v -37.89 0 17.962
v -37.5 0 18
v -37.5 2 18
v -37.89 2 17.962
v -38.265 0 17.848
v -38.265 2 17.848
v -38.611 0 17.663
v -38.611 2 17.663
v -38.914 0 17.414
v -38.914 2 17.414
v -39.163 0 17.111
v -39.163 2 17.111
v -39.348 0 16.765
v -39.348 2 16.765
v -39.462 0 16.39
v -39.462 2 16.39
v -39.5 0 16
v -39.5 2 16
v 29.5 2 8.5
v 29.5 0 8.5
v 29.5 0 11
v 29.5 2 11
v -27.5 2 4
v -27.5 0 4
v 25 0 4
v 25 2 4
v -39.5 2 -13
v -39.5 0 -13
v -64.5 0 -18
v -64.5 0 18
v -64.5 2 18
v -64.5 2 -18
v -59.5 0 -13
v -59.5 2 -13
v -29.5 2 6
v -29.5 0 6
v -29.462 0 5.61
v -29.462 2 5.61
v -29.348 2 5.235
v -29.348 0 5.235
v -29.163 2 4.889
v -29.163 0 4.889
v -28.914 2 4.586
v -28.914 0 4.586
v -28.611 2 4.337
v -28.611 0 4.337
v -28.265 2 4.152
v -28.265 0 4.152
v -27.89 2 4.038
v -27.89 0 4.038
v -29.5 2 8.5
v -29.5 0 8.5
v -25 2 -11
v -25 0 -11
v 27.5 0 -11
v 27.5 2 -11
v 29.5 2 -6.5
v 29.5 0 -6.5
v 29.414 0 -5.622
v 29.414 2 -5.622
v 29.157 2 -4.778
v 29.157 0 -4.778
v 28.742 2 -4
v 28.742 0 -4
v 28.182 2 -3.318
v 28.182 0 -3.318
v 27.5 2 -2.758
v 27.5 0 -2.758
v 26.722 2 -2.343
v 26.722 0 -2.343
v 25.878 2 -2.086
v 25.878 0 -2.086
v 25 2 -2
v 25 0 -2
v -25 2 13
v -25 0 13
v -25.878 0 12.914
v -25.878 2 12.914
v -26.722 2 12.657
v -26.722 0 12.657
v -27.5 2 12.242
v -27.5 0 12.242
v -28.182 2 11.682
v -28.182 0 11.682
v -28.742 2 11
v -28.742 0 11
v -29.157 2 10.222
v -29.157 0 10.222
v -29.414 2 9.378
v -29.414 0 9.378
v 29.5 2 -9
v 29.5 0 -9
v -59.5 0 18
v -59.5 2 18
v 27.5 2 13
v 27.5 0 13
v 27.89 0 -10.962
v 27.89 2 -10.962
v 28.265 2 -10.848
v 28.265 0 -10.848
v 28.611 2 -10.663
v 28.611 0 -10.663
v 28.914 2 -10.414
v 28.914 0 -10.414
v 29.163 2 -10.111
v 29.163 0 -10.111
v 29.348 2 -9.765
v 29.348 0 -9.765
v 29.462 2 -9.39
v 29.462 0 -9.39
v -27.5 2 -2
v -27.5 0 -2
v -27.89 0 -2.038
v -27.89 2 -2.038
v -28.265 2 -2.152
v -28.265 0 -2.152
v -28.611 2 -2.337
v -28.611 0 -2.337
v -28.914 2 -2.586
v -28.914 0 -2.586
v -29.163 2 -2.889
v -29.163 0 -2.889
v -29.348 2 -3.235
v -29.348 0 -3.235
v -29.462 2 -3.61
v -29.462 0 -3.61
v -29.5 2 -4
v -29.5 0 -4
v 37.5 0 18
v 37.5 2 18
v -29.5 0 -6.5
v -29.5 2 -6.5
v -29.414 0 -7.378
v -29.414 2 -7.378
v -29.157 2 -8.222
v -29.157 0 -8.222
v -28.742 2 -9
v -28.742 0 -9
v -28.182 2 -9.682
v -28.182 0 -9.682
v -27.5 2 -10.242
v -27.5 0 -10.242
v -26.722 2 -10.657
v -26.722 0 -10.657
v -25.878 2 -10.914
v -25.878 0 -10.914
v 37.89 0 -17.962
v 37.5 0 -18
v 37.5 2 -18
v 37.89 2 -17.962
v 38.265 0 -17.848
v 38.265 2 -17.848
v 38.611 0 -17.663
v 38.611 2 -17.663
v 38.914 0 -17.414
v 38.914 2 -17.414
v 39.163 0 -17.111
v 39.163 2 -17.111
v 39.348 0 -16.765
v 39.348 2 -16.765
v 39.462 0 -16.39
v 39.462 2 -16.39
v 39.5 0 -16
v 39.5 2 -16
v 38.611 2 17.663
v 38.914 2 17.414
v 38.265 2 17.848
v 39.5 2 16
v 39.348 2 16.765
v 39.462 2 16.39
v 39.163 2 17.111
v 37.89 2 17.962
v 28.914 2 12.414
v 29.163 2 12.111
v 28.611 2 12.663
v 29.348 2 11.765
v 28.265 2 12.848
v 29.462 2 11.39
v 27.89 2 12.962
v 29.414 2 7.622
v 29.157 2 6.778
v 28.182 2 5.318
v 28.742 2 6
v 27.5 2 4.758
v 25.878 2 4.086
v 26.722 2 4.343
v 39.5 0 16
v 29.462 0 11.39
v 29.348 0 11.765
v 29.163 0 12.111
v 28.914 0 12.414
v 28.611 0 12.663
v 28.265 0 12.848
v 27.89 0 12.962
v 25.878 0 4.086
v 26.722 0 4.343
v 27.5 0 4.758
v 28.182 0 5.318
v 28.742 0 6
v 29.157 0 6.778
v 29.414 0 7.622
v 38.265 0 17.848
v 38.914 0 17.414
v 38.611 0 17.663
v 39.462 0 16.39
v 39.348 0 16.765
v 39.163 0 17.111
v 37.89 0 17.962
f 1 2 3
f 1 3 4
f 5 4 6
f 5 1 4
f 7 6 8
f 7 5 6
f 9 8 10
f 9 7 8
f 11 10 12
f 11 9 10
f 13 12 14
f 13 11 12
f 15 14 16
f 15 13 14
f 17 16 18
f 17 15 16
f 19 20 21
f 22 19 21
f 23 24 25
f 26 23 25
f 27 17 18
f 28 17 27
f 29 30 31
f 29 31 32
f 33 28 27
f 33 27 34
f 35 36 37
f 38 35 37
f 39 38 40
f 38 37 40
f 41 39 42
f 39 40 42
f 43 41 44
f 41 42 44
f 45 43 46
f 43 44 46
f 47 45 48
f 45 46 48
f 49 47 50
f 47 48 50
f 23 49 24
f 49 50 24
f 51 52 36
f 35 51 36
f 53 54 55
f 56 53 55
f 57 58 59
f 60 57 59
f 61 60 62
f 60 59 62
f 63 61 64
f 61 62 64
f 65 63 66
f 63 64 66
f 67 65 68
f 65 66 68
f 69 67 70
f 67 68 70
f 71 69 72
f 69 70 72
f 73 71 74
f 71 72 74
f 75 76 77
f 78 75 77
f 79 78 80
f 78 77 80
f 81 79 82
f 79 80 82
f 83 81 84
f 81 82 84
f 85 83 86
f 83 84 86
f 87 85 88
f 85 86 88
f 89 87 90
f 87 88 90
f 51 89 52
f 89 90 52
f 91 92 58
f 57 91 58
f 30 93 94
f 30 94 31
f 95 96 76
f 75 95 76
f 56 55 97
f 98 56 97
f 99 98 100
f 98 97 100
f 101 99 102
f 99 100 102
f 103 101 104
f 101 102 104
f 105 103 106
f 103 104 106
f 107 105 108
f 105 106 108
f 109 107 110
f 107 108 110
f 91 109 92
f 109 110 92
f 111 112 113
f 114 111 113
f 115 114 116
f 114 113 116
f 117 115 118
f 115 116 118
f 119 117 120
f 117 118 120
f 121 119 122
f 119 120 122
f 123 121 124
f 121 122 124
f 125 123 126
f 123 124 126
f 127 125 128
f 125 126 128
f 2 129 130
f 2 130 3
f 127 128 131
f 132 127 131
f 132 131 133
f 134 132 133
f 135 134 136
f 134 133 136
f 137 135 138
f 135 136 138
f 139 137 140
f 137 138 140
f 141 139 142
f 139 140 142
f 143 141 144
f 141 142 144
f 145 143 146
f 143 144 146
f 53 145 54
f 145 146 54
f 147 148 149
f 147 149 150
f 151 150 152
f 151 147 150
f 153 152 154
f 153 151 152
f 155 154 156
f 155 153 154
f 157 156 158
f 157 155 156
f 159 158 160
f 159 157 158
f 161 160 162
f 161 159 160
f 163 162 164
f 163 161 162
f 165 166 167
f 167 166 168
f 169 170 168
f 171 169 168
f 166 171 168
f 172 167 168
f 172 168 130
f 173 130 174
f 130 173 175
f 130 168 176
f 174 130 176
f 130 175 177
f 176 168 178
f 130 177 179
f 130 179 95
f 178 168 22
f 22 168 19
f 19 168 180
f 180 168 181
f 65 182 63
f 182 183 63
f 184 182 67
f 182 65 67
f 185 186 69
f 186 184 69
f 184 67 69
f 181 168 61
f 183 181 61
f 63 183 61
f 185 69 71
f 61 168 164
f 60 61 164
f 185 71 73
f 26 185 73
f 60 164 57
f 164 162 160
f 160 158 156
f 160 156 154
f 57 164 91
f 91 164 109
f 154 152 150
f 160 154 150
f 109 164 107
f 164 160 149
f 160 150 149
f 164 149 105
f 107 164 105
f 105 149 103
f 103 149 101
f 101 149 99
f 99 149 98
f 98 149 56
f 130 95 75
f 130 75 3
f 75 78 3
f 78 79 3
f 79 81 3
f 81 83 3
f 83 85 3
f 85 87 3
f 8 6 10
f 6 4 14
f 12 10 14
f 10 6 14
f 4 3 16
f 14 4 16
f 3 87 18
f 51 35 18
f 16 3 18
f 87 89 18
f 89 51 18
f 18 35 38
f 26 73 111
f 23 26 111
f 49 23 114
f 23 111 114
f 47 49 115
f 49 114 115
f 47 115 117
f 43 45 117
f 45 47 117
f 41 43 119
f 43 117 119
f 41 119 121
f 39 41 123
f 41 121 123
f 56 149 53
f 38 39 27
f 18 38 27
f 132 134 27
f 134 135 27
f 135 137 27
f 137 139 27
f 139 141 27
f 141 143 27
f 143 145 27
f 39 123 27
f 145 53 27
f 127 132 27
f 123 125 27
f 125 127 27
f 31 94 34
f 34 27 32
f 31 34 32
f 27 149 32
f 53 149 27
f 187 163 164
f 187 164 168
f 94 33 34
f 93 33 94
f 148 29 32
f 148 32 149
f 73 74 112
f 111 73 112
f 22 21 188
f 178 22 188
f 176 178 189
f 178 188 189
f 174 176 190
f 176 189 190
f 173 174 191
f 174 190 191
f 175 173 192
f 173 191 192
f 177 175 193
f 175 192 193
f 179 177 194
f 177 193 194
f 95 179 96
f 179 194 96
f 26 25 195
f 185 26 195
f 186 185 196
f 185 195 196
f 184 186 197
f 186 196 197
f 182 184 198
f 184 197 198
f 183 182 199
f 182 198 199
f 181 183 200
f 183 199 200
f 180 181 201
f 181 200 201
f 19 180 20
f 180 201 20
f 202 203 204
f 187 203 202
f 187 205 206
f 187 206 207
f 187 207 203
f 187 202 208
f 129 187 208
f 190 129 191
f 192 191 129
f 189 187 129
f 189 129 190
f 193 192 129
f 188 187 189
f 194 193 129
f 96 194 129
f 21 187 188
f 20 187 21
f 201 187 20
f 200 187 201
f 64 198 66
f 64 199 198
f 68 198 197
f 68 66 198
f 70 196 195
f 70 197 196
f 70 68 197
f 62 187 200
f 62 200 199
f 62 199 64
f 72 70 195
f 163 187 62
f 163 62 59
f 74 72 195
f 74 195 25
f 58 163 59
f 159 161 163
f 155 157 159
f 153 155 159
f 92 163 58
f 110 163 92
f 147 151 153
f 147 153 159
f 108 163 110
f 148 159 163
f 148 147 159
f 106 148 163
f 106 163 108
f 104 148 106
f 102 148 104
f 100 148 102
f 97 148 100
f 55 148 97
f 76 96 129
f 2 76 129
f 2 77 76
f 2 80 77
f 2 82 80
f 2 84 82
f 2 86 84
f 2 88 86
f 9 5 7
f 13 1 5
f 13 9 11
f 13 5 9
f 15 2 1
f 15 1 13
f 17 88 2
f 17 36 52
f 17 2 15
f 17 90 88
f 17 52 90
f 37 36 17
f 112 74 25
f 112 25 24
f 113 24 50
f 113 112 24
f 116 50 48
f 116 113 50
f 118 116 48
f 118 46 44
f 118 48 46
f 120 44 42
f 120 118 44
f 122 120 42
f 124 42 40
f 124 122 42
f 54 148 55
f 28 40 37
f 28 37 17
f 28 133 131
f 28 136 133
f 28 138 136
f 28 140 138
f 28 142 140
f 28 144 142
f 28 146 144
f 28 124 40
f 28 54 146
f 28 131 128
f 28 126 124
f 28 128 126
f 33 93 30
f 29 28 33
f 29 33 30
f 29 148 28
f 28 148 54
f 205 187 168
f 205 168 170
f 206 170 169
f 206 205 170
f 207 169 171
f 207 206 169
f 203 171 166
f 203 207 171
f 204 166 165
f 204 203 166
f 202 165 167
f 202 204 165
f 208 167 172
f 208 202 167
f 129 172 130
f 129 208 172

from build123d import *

# Parameters (mm, degrees)
BOSS_EXTRUDE1_DEPTH = 2


with BuildPart() as part:
    # Sketch1 → Boss-Extrude1 (new body)
    with BuildSketch(Plane(origin=(0, 0, 0), x_dir=(1, 0, 0), z_dir=(0, 1, 0))):
        with BuildLine():
            Line((-39.5, -16), (-39.5, 13))
            Line((-39.5, 13), (-59.5, 13))
            Line((-59.5, 13), (-59.5, -18))
            Line((-59.5, -18), (-64.5, -18))
            Line((-64.5, -18), (-64.5, 18))
            Line((-64.5, 18), (-39.5, 18))
            Line((-39.5, 18), (37.5, 18))
            ThreePointArc((37.5, 18), (38.914213562, 17.414213562), (39.5, 16))
            Line((39.5, 16), (39.5, -16))
            ThreePointArc((39.5, -16), (38.914213562, -17.414213562), (37.5, -18))
            Line((37.5, -18), (-37.5, -18))
            ThreePointArc((-37.5, -18), (-38.914213562, -17.414213562), (-39.5, -16))
        make_face()
        with BuildLine():
            Line((-25, 11), (27.5, 11))
            ThreePointArc((27.5, 11), (28.914213562, 10.414213562), (29.5, 9))
            Line((29.5, 9), (29.5, 6.5))
            ThreePointArc((29.5, 6.5), (28.181980515, 3.318019485), (25, 2))
            Line((25, 2), (-27.5, 2))
            ThreePointArc((-27.5, 2), (-28.914213562, 2.585786438), (-29.5, 4))
            Line((-29.5, 4), (-29.5, 6.5))
            ThreePointArc((-29.5, 6.5), (-28.181980515, 9.681980515), (-25, 11))
        make_face(mode=Mode.SUBTRACT)
        with BuildLine():
            Line((-27.5, -4), (25, -4))
            ThreePointArc((25, -4), (28.181980515, -5.318019485), (29.5, -8.5))
            Line((29.5, -8.5), (29.5, -11))
            ThreePointArc((29.5, -11), (28.914213562, -12.414213562), (27.5, -13))
            Line((27.5, -13), (-25, -13))
            ThreePointArc((-25, -13), (-28.181980515, -11.681980515), (-29.5, -8.5))
            Line((-29.5, -8.5), (-29.5, -6))
            ThreePointArc((-29.5, -6), (-28.914213562, -4.585786438), (-27.5, -4))
        make_face(mode=Mode.SUBTRACT)
    extrude(amount=BOSS_EXTRUDE1_DEPTH)


solid = part.part
